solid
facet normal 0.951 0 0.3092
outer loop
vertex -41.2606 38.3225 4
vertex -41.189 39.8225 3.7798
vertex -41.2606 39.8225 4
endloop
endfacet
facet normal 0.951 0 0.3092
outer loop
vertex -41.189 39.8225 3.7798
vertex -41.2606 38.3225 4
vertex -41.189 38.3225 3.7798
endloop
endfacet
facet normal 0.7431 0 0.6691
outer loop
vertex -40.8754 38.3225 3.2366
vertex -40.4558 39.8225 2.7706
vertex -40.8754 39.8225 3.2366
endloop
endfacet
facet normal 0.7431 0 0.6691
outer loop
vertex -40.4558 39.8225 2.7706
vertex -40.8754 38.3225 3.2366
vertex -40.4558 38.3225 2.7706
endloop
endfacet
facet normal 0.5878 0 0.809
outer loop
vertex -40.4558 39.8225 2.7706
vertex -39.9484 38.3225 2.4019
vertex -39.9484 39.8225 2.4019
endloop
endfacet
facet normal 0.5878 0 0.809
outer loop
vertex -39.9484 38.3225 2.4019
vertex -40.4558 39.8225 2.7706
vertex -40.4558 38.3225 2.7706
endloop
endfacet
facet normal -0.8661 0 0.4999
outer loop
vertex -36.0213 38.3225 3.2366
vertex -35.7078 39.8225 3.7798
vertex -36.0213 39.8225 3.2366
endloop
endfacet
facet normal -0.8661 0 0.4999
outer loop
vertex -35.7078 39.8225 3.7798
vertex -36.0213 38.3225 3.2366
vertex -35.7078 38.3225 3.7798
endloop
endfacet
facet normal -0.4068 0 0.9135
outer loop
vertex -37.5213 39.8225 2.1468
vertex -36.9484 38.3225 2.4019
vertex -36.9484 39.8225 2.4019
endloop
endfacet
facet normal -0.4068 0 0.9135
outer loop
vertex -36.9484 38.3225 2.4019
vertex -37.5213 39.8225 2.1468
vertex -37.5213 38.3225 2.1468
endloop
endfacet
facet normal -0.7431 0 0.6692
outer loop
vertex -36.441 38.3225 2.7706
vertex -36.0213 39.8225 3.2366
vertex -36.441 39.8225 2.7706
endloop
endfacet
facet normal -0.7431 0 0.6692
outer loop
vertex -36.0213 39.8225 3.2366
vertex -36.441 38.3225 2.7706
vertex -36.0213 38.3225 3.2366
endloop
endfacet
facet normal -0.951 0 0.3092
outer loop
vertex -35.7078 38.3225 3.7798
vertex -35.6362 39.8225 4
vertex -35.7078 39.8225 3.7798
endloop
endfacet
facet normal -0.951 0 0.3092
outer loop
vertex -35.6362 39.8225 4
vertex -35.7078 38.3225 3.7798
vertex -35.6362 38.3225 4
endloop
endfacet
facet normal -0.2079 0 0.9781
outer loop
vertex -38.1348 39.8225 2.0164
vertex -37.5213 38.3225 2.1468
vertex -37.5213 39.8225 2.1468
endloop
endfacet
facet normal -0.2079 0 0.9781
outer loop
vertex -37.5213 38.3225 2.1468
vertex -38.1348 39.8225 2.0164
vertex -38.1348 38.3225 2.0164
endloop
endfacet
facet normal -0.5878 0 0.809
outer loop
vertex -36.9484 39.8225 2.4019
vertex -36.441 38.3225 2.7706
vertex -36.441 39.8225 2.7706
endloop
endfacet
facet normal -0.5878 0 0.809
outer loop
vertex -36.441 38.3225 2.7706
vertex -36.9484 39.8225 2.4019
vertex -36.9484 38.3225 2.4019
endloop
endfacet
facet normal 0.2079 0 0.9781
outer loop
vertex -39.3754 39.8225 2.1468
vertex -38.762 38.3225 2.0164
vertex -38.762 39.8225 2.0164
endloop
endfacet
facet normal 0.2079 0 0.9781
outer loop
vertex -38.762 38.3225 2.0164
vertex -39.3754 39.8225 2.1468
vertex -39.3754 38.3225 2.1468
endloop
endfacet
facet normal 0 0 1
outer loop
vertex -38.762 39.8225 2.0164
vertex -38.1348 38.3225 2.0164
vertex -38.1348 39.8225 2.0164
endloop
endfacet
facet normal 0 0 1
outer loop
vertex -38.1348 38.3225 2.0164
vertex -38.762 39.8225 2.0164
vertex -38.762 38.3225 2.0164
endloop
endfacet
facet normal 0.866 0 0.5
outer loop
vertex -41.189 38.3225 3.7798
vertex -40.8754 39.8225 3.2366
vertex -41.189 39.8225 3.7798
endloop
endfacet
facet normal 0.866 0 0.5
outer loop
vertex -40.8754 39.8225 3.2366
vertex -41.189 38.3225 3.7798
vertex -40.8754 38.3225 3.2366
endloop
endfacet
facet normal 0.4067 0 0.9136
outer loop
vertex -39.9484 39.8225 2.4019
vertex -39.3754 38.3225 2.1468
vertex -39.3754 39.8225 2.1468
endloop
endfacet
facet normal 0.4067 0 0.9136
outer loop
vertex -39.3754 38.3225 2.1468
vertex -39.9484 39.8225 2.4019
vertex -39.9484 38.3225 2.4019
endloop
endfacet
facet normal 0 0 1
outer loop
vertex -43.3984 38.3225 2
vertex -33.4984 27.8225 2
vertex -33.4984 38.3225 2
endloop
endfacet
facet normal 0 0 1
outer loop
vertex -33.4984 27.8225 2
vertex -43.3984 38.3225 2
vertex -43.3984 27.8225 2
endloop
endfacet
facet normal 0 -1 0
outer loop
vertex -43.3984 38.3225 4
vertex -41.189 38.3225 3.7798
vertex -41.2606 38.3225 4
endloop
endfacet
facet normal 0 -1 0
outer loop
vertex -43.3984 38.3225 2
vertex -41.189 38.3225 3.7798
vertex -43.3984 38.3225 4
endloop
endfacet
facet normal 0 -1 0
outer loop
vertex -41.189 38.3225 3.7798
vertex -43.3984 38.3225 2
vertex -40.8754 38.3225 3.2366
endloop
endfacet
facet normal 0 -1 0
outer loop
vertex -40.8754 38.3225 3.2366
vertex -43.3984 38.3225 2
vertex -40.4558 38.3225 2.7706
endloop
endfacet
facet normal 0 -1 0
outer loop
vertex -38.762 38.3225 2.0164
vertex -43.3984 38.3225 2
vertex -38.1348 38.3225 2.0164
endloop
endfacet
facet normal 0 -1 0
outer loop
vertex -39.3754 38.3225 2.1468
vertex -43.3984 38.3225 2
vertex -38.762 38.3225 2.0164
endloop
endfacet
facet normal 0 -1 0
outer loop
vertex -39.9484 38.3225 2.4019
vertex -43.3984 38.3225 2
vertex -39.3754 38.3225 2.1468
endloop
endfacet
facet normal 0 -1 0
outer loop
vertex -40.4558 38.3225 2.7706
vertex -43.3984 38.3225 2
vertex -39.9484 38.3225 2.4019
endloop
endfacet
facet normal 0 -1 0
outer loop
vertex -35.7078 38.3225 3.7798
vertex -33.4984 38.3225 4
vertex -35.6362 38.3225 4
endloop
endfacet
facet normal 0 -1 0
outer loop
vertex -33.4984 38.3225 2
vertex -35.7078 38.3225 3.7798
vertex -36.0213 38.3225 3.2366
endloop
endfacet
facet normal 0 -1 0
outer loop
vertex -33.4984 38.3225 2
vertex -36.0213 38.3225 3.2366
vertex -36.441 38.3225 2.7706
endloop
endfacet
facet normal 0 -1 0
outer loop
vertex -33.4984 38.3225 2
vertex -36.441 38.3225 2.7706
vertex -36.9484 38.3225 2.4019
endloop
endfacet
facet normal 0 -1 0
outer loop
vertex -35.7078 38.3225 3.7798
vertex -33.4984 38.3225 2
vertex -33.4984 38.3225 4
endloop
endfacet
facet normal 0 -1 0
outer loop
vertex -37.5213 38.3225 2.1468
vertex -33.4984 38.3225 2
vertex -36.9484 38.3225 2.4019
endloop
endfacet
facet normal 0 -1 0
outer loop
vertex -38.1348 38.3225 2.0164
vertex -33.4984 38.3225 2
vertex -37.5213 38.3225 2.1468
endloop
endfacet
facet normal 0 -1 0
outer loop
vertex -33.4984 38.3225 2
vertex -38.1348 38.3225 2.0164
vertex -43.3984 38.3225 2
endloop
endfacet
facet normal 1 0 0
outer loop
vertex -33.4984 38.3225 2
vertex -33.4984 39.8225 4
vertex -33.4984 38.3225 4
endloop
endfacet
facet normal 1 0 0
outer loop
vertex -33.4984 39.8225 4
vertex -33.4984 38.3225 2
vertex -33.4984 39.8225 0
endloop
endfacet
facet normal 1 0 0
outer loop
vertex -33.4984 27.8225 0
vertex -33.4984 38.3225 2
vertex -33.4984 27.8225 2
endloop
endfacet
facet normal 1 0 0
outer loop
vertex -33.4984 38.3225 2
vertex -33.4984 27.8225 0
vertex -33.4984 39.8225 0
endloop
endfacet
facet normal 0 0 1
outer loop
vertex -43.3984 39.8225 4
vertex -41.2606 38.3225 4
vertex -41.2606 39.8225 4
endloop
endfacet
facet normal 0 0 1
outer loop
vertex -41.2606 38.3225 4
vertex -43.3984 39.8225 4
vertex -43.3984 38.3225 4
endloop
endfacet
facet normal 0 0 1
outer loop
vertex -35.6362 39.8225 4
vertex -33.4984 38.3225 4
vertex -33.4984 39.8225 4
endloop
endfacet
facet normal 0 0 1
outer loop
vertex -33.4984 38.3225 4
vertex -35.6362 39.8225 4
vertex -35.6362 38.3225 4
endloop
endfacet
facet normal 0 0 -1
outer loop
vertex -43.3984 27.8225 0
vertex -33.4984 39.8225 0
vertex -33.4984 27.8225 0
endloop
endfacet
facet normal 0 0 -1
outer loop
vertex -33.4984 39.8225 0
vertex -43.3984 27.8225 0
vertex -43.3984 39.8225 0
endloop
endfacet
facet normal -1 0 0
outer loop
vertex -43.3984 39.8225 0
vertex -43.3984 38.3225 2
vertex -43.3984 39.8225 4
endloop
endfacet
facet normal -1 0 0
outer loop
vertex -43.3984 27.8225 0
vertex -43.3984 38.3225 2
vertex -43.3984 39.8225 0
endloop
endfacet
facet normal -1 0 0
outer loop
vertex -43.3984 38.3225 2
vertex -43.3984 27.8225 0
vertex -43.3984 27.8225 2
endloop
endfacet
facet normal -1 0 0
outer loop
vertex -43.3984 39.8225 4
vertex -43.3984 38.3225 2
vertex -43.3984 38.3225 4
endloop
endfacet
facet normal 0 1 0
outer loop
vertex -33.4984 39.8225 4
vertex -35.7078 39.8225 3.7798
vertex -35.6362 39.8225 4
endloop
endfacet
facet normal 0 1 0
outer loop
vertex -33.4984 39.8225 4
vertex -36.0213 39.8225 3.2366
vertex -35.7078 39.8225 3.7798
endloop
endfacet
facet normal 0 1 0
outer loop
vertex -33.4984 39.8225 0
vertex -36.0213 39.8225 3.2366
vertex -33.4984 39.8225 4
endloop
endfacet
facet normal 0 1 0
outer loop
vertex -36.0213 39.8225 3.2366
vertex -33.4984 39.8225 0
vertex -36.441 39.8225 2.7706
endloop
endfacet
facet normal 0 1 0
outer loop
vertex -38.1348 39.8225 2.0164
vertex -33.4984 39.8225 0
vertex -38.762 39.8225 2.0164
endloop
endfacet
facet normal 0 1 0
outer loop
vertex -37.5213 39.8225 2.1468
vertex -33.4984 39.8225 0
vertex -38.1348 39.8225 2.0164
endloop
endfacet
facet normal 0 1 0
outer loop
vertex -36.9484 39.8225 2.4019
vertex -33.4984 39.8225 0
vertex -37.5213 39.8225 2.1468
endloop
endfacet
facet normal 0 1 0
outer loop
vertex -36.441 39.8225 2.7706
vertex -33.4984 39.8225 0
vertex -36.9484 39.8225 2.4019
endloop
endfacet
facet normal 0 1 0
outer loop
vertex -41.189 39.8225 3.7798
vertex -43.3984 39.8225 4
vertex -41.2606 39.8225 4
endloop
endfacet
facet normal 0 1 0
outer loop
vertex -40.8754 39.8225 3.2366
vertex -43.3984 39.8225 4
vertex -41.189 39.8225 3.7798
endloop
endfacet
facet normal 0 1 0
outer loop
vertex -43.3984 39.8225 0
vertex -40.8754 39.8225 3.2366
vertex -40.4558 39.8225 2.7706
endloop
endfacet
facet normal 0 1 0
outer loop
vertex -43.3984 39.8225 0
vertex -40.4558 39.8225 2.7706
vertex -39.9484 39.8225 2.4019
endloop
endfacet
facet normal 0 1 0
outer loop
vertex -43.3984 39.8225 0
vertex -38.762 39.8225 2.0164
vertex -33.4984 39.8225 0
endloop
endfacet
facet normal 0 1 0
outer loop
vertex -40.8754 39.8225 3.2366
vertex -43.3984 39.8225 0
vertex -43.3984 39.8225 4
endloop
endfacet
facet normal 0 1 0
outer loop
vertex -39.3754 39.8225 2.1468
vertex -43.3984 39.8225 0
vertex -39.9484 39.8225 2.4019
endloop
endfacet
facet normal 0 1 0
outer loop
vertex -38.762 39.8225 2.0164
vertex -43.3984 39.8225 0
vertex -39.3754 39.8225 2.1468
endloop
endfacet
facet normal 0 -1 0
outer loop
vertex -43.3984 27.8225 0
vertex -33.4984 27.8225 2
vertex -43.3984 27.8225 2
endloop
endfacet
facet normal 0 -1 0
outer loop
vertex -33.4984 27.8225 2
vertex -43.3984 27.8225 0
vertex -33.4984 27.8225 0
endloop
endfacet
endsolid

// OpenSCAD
difference () {
  union () {
    translate ([-38.448391581809624, 33.822509527362804, 2]) {
      cube ([9.9, 12, 4], center=true);
    }
  }
  union () {
    translate ([-38.448391581809624, 39.822509527362804, 5]) {
      rotate (a=90.0, v=[1, 0, 0]) {
        cylinder ($fn=30, h=20, r=3, center=true);
      }
    }
    translate ([-38.448391581809624, 32.822509527362804, 11/2]) {
      cube ([11, 11, 7], center=true);
    }
  }
}
